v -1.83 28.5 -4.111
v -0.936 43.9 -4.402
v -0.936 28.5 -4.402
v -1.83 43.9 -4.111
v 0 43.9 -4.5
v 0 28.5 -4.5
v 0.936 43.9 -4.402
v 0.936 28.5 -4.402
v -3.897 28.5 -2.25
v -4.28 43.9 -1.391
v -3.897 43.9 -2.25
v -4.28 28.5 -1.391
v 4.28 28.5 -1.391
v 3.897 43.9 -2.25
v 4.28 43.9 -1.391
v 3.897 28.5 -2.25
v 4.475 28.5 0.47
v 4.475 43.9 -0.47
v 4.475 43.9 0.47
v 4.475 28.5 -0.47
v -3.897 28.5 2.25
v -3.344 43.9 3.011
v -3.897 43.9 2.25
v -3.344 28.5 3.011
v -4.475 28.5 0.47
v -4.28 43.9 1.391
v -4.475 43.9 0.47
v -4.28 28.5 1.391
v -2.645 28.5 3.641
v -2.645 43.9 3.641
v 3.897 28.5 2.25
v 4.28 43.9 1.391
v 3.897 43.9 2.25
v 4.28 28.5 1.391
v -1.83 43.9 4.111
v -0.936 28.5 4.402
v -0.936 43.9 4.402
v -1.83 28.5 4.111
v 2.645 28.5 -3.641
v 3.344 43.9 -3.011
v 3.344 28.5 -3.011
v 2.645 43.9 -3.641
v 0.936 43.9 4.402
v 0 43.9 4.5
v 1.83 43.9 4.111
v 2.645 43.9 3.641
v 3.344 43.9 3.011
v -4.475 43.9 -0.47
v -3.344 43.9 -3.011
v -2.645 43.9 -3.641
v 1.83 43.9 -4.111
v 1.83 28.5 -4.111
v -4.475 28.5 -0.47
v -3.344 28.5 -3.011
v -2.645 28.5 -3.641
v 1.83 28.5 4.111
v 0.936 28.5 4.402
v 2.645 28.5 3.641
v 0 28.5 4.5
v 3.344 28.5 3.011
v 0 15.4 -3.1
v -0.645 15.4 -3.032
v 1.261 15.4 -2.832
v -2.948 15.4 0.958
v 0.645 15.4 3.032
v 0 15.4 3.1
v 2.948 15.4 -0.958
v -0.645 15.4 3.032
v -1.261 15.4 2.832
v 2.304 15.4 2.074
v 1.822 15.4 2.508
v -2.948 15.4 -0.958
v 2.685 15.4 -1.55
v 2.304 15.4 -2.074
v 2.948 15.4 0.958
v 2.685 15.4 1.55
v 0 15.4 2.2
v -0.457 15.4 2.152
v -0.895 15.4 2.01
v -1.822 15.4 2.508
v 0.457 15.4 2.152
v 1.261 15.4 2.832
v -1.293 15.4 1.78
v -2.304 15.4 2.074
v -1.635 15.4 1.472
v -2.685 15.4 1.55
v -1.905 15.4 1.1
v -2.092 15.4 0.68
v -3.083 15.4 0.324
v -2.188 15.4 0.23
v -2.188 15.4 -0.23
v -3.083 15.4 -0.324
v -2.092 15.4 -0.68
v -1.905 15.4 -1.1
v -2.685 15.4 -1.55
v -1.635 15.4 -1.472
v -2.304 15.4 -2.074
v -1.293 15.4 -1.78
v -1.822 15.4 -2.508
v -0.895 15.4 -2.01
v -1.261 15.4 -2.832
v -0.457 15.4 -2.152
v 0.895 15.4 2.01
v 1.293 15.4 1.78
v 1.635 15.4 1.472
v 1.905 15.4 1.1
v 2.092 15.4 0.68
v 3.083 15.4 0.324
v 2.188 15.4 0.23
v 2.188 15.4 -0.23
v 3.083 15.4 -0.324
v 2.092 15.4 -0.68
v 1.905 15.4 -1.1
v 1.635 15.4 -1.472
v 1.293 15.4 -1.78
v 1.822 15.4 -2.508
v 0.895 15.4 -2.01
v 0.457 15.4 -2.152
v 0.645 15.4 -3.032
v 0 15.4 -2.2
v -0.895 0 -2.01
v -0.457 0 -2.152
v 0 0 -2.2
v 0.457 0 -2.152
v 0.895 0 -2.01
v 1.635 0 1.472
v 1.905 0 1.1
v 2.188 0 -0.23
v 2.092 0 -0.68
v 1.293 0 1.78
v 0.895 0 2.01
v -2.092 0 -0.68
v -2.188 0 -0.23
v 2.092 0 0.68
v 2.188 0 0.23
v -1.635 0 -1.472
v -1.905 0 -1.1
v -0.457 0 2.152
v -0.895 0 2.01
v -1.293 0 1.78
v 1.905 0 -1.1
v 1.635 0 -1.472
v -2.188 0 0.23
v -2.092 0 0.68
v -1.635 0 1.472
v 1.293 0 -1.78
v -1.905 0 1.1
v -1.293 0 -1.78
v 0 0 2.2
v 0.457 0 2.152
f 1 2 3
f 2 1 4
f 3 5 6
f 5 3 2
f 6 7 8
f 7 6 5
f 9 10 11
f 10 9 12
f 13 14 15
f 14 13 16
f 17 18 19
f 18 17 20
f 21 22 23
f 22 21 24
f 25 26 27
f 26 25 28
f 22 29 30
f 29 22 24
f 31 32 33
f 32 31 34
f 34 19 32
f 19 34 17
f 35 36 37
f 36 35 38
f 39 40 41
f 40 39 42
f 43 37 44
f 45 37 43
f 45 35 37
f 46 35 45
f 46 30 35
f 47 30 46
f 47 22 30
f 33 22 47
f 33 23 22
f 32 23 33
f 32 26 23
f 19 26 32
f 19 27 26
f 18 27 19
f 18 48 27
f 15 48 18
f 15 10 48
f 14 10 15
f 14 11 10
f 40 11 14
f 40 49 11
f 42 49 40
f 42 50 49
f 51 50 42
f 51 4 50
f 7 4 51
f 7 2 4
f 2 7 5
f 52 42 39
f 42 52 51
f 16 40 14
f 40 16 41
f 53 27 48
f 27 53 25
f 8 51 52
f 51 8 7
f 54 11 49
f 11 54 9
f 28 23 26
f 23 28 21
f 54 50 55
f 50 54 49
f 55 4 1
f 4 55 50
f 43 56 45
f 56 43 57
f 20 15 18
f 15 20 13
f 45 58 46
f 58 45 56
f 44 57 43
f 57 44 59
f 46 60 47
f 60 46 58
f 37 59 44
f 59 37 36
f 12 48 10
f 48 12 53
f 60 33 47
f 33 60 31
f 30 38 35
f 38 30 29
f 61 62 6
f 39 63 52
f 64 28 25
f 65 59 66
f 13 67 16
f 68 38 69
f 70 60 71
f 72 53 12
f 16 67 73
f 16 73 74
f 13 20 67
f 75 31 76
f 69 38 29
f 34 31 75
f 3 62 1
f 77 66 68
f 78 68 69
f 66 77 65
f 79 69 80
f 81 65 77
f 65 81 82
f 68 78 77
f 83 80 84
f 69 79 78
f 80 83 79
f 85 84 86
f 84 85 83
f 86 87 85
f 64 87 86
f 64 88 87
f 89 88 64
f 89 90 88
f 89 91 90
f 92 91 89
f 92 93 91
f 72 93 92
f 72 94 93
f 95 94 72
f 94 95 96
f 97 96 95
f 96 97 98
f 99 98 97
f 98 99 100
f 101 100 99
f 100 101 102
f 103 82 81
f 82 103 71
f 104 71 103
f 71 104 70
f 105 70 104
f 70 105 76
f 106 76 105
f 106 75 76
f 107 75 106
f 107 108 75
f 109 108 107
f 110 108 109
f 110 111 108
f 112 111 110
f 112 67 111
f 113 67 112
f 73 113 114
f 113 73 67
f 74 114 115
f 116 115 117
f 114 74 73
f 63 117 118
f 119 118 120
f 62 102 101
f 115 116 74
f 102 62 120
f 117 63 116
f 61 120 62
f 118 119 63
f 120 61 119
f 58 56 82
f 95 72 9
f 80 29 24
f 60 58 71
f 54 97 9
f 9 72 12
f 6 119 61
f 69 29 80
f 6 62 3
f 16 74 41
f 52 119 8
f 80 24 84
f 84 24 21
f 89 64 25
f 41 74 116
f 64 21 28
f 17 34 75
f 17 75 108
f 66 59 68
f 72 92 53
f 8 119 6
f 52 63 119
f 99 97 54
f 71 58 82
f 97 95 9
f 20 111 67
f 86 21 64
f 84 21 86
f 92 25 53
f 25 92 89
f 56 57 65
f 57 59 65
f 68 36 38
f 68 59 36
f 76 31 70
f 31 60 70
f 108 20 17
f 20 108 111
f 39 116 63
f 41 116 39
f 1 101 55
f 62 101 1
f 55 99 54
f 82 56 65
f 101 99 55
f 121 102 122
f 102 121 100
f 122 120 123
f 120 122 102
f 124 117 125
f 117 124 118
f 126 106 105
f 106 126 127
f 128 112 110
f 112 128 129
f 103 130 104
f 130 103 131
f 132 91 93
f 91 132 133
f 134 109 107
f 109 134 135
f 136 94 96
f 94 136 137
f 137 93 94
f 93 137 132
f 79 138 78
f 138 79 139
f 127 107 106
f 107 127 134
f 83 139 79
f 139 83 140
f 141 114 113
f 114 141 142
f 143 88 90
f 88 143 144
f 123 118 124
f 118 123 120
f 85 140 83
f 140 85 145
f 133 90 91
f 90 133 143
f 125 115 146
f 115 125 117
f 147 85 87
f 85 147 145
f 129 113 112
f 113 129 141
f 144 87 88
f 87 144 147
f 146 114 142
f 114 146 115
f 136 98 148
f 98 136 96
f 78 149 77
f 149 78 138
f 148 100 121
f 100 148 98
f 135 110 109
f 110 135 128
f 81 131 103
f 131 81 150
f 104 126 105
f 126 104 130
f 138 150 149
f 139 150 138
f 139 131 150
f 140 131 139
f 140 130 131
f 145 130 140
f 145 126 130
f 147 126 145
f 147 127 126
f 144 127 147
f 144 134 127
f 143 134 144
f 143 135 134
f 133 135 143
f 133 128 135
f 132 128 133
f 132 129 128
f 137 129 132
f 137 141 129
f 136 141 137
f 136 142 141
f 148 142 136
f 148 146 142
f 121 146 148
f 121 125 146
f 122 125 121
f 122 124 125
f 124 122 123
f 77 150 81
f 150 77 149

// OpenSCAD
//Radius = 63.3
//Gap between cables = 4.5
//Distance to middle = 34.6
//Width of cables = 22
// Top of cables = 10.5
//Depth of cavity = 19
$fs=0.01;
module cable1(){
    sec1_len = 15.4;
    translate([0,0 , 15.4+13.1]){cylinder(15.4,4.5,4.5);};
    translate([0,0 , 15.4]){cylinder(13.1, 3.1, 4.5);};
    {cylinder(20, 2.2, 2.2);};
};
difference(){
    //cylinder(19, 31.65, 30.65);
    //translate([-50,2.95,0]){cube([100,100,100]);};
};
rotate([0,90,90]){
cable1();
};
